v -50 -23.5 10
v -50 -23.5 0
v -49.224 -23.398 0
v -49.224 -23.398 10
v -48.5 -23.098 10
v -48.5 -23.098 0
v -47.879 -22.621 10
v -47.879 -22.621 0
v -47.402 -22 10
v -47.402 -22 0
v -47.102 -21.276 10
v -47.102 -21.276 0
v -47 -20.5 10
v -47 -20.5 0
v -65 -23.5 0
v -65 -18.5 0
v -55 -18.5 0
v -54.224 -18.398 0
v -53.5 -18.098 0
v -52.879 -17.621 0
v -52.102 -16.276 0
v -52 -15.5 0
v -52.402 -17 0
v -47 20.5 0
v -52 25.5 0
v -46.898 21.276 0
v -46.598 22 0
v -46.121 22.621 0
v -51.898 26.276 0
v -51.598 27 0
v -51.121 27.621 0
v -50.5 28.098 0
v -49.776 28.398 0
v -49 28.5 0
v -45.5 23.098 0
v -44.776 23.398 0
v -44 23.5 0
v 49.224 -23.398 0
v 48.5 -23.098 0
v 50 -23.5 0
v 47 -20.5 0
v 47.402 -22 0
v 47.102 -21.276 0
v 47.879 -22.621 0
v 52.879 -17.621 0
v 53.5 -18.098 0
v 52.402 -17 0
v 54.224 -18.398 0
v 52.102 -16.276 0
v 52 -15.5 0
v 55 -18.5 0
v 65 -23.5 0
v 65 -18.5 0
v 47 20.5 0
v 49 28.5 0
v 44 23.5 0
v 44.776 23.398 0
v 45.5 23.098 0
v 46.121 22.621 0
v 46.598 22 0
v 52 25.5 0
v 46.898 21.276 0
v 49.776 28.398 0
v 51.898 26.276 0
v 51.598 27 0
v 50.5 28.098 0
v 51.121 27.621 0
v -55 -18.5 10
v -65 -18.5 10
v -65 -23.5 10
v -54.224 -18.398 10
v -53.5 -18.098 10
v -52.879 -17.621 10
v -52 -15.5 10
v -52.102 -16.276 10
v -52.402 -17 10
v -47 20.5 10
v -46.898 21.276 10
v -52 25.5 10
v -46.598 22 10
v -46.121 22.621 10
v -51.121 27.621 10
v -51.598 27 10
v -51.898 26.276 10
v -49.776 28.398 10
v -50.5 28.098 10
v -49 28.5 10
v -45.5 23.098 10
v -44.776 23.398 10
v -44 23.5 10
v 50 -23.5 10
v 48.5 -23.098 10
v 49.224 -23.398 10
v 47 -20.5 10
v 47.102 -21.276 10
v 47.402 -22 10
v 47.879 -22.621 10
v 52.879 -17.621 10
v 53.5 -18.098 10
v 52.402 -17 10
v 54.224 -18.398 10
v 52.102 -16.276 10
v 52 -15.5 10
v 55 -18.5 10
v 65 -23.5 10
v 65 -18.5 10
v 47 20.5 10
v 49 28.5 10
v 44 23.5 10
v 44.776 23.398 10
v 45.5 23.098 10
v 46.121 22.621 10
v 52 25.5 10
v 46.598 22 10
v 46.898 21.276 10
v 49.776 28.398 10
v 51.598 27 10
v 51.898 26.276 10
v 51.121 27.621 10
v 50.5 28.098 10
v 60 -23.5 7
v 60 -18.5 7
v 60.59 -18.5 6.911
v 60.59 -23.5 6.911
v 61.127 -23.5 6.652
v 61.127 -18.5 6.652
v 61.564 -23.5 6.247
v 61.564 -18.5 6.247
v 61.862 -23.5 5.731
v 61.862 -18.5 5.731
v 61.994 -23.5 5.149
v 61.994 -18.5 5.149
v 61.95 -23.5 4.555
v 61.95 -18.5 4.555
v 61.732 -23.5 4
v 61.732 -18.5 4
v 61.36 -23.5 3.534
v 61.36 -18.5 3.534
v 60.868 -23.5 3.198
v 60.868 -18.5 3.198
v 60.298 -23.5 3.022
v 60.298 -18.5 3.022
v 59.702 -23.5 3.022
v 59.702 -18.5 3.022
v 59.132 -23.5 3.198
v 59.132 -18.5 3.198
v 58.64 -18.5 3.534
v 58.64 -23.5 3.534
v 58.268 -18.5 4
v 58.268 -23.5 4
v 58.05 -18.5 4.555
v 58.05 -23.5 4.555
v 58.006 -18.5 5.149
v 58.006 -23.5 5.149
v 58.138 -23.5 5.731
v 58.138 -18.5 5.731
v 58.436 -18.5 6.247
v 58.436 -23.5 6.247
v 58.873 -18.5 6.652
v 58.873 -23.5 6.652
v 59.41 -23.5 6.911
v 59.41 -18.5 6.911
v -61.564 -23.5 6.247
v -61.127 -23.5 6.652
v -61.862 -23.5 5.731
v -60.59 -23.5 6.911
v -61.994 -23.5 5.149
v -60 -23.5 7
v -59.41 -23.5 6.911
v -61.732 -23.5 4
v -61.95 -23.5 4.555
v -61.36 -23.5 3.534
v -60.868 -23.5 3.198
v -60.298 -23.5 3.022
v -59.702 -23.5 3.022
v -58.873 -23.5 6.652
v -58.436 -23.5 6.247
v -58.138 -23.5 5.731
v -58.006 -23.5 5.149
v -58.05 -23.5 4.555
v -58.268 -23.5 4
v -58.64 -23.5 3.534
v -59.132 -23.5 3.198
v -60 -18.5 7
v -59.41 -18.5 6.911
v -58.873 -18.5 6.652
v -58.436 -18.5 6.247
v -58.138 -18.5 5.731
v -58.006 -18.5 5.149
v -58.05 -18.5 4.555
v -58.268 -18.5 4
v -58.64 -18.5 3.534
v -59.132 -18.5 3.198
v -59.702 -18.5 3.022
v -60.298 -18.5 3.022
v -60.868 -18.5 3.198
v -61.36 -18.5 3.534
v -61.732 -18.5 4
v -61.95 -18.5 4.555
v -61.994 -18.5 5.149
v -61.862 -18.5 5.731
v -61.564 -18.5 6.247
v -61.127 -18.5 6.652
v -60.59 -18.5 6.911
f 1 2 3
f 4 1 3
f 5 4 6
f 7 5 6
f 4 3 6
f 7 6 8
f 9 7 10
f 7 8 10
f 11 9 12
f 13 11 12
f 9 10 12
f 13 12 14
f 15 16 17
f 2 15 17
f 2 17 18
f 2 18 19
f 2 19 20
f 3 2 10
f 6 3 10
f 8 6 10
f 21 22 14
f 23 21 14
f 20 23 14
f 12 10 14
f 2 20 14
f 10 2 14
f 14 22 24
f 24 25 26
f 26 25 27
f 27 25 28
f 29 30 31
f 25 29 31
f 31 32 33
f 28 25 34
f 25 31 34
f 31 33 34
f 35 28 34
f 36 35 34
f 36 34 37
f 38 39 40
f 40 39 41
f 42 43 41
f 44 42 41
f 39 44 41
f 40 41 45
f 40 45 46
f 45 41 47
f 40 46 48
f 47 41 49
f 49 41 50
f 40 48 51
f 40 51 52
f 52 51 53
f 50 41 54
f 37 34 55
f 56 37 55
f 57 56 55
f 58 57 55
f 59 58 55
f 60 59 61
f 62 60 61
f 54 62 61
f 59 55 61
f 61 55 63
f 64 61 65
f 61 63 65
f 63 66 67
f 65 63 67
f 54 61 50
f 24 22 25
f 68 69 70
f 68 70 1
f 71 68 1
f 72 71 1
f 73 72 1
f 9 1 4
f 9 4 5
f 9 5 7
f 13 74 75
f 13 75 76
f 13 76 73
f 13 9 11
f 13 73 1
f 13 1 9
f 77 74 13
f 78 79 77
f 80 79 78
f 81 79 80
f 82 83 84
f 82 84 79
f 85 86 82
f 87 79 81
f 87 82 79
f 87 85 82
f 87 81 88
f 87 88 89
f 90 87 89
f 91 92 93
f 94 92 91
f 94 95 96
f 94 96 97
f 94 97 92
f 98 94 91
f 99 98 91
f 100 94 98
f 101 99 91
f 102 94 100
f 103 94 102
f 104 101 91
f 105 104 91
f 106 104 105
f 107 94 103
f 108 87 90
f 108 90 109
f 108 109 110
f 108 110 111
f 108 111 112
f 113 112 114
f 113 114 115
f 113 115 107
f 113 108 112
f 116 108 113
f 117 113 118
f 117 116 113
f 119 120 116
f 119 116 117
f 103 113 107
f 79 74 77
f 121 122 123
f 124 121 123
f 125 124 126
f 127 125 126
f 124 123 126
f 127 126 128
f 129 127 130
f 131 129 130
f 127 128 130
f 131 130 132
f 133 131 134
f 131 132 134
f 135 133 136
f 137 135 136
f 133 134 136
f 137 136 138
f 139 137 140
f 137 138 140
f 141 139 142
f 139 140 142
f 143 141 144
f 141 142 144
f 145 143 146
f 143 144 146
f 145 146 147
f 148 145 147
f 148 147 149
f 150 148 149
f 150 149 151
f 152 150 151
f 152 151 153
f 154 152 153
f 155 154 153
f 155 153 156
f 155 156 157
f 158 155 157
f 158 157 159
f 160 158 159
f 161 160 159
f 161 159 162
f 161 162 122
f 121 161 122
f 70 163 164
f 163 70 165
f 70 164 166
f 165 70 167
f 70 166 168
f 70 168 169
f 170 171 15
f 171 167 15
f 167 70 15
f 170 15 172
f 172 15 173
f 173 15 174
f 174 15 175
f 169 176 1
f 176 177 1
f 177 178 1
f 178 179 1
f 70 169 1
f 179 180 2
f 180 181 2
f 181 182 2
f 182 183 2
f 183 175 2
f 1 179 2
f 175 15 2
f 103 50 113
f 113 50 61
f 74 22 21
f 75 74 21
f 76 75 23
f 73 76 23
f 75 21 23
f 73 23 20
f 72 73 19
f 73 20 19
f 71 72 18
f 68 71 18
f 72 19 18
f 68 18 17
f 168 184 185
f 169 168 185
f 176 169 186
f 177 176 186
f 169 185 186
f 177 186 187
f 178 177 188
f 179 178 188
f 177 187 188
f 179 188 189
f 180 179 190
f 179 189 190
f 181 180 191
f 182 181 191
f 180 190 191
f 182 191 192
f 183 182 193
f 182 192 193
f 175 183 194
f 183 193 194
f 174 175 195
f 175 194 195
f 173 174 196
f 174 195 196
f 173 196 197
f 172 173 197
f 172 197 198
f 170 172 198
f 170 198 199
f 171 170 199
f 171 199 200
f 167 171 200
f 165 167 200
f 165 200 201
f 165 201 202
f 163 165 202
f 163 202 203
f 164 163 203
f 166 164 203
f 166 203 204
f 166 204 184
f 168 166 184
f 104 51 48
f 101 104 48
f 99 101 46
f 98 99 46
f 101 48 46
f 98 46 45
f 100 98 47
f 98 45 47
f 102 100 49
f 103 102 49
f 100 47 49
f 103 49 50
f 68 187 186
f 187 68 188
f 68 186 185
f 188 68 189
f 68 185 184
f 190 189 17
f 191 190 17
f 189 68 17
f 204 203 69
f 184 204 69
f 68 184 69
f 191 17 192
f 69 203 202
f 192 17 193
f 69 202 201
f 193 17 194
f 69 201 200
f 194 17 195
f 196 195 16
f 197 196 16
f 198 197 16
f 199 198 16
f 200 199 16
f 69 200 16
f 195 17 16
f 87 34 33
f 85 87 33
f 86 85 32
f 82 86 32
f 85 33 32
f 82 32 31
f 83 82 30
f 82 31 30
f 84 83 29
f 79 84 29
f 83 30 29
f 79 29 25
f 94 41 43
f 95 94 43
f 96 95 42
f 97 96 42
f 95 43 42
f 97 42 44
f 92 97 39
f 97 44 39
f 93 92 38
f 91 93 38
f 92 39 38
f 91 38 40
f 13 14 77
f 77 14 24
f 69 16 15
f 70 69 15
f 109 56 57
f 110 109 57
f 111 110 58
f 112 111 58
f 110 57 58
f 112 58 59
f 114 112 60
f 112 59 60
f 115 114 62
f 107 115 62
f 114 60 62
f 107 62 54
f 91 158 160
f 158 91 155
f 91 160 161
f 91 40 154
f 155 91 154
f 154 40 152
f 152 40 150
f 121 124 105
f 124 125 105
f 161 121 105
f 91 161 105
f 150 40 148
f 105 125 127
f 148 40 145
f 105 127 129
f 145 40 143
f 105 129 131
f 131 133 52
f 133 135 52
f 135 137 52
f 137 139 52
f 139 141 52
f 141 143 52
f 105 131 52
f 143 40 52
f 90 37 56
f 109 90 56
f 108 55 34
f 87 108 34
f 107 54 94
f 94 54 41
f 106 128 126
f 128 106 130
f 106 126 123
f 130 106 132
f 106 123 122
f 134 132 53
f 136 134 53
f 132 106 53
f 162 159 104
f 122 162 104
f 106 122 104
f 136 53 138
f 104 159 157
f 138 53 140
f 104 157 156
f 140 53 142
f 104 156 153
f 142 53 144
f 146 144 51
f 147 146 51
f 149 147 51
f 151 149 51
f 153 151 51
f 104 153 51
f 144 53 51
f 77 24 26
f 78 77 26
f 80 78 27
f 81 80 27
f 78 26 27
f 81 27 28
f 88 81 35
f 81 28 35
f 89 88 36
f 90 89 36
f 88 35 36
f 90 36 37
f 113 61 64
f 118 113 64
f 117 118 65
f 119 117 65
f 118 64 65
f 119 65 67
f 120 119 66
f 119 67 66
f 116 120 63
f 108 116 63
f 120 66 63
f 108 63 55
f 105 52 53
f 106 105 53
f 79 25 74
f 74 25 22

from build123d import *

# Parameters (mm, degrees)
BOSS_EXTRUDE1_DEPTH = 10
SKETCH2_R           = 2
CUT_EXTRUDE1_DEPTH  = 81.833161512


with BuildPart() as part:
    # Sketch1 → Boss-Extrude1 (new body)
    with BuildSketch(Plane.XY):
        with BuildLine():
            Line((52, -15.5), (52, 25.5))
            ThreePointArc((52, 25.5), (51.121320344, 27.621320344), (49, 28.5))
            Line((49, 28.5), (-49, 28.5))
            ThreePointArc((-49, 28.5), (-51.121320344, 27.621320344), (-52, 25.5))
            Line((-52, 25.5), (-52, -15.5))
            ThreePointArc((-52, -15.5), (-52.878679656, -17.621320344), (-55, -18.5))
            Line((-55, -18.5), (-65, -18.5))
            Line((-65, -18.5), (-65, -23.5))
            Line((-65, -23.5), (-52, -23.5))
            Line((-52, -23.5), (-50, -23.5))
            ThreePointArc((-50, -23.5), (-47.878679656, -22.621320344), (-47, -20.5))
            Line((-47, -20.5), (-47, 20.5))
            ThreePointArc((-47, 20.5), (-46.121320344, 22.621320344), (-44, 23.5))
            Line((-44, 23.5), (44, 23.5))
            ThreePointArc((44, 23.5), (46.121320344, 22.621320344), (47, 20.5))
            Line((47, 20.5), (47, -20.5))
            ThreePointArc((47, -20.5), (47.878679656, -22.621320344), (50, -23.5))
            Line((50, -23.5), (52, -23.5))
            Line((52, -23.5), (65, -23.5))
            Line((65, -23.5), (65, -18.5))
            Line((65, -18.5), (55, -18.5))
            ThreePointArc((55, -18.5), (52.878679656, -17.621320344), (52, -15.5))
        make_face()
    extrude(amount=BOSS_EXTRUDE1_DEPTH)

    # Sketch2 → Cut-Extrude1 (cut, through all)
    with BuildSketch(Plane(origin=(0, -18.5, 0), x_dir=(1, 0, 0), z_dir=(0, 1, 0))):
        with Locations(Location((-60, -5, 0), (0, 0, 270))):
            Circle(SKETCH2_R)
        with Locations(Location((60, -5, 0), (0, 0, 270))):
            Circle(SKETCH2_R)
    extrude(amount=-CUT_EXTRUDE1_DEPTH, mode=Mode.SUBTRACT)


solid = part.part
